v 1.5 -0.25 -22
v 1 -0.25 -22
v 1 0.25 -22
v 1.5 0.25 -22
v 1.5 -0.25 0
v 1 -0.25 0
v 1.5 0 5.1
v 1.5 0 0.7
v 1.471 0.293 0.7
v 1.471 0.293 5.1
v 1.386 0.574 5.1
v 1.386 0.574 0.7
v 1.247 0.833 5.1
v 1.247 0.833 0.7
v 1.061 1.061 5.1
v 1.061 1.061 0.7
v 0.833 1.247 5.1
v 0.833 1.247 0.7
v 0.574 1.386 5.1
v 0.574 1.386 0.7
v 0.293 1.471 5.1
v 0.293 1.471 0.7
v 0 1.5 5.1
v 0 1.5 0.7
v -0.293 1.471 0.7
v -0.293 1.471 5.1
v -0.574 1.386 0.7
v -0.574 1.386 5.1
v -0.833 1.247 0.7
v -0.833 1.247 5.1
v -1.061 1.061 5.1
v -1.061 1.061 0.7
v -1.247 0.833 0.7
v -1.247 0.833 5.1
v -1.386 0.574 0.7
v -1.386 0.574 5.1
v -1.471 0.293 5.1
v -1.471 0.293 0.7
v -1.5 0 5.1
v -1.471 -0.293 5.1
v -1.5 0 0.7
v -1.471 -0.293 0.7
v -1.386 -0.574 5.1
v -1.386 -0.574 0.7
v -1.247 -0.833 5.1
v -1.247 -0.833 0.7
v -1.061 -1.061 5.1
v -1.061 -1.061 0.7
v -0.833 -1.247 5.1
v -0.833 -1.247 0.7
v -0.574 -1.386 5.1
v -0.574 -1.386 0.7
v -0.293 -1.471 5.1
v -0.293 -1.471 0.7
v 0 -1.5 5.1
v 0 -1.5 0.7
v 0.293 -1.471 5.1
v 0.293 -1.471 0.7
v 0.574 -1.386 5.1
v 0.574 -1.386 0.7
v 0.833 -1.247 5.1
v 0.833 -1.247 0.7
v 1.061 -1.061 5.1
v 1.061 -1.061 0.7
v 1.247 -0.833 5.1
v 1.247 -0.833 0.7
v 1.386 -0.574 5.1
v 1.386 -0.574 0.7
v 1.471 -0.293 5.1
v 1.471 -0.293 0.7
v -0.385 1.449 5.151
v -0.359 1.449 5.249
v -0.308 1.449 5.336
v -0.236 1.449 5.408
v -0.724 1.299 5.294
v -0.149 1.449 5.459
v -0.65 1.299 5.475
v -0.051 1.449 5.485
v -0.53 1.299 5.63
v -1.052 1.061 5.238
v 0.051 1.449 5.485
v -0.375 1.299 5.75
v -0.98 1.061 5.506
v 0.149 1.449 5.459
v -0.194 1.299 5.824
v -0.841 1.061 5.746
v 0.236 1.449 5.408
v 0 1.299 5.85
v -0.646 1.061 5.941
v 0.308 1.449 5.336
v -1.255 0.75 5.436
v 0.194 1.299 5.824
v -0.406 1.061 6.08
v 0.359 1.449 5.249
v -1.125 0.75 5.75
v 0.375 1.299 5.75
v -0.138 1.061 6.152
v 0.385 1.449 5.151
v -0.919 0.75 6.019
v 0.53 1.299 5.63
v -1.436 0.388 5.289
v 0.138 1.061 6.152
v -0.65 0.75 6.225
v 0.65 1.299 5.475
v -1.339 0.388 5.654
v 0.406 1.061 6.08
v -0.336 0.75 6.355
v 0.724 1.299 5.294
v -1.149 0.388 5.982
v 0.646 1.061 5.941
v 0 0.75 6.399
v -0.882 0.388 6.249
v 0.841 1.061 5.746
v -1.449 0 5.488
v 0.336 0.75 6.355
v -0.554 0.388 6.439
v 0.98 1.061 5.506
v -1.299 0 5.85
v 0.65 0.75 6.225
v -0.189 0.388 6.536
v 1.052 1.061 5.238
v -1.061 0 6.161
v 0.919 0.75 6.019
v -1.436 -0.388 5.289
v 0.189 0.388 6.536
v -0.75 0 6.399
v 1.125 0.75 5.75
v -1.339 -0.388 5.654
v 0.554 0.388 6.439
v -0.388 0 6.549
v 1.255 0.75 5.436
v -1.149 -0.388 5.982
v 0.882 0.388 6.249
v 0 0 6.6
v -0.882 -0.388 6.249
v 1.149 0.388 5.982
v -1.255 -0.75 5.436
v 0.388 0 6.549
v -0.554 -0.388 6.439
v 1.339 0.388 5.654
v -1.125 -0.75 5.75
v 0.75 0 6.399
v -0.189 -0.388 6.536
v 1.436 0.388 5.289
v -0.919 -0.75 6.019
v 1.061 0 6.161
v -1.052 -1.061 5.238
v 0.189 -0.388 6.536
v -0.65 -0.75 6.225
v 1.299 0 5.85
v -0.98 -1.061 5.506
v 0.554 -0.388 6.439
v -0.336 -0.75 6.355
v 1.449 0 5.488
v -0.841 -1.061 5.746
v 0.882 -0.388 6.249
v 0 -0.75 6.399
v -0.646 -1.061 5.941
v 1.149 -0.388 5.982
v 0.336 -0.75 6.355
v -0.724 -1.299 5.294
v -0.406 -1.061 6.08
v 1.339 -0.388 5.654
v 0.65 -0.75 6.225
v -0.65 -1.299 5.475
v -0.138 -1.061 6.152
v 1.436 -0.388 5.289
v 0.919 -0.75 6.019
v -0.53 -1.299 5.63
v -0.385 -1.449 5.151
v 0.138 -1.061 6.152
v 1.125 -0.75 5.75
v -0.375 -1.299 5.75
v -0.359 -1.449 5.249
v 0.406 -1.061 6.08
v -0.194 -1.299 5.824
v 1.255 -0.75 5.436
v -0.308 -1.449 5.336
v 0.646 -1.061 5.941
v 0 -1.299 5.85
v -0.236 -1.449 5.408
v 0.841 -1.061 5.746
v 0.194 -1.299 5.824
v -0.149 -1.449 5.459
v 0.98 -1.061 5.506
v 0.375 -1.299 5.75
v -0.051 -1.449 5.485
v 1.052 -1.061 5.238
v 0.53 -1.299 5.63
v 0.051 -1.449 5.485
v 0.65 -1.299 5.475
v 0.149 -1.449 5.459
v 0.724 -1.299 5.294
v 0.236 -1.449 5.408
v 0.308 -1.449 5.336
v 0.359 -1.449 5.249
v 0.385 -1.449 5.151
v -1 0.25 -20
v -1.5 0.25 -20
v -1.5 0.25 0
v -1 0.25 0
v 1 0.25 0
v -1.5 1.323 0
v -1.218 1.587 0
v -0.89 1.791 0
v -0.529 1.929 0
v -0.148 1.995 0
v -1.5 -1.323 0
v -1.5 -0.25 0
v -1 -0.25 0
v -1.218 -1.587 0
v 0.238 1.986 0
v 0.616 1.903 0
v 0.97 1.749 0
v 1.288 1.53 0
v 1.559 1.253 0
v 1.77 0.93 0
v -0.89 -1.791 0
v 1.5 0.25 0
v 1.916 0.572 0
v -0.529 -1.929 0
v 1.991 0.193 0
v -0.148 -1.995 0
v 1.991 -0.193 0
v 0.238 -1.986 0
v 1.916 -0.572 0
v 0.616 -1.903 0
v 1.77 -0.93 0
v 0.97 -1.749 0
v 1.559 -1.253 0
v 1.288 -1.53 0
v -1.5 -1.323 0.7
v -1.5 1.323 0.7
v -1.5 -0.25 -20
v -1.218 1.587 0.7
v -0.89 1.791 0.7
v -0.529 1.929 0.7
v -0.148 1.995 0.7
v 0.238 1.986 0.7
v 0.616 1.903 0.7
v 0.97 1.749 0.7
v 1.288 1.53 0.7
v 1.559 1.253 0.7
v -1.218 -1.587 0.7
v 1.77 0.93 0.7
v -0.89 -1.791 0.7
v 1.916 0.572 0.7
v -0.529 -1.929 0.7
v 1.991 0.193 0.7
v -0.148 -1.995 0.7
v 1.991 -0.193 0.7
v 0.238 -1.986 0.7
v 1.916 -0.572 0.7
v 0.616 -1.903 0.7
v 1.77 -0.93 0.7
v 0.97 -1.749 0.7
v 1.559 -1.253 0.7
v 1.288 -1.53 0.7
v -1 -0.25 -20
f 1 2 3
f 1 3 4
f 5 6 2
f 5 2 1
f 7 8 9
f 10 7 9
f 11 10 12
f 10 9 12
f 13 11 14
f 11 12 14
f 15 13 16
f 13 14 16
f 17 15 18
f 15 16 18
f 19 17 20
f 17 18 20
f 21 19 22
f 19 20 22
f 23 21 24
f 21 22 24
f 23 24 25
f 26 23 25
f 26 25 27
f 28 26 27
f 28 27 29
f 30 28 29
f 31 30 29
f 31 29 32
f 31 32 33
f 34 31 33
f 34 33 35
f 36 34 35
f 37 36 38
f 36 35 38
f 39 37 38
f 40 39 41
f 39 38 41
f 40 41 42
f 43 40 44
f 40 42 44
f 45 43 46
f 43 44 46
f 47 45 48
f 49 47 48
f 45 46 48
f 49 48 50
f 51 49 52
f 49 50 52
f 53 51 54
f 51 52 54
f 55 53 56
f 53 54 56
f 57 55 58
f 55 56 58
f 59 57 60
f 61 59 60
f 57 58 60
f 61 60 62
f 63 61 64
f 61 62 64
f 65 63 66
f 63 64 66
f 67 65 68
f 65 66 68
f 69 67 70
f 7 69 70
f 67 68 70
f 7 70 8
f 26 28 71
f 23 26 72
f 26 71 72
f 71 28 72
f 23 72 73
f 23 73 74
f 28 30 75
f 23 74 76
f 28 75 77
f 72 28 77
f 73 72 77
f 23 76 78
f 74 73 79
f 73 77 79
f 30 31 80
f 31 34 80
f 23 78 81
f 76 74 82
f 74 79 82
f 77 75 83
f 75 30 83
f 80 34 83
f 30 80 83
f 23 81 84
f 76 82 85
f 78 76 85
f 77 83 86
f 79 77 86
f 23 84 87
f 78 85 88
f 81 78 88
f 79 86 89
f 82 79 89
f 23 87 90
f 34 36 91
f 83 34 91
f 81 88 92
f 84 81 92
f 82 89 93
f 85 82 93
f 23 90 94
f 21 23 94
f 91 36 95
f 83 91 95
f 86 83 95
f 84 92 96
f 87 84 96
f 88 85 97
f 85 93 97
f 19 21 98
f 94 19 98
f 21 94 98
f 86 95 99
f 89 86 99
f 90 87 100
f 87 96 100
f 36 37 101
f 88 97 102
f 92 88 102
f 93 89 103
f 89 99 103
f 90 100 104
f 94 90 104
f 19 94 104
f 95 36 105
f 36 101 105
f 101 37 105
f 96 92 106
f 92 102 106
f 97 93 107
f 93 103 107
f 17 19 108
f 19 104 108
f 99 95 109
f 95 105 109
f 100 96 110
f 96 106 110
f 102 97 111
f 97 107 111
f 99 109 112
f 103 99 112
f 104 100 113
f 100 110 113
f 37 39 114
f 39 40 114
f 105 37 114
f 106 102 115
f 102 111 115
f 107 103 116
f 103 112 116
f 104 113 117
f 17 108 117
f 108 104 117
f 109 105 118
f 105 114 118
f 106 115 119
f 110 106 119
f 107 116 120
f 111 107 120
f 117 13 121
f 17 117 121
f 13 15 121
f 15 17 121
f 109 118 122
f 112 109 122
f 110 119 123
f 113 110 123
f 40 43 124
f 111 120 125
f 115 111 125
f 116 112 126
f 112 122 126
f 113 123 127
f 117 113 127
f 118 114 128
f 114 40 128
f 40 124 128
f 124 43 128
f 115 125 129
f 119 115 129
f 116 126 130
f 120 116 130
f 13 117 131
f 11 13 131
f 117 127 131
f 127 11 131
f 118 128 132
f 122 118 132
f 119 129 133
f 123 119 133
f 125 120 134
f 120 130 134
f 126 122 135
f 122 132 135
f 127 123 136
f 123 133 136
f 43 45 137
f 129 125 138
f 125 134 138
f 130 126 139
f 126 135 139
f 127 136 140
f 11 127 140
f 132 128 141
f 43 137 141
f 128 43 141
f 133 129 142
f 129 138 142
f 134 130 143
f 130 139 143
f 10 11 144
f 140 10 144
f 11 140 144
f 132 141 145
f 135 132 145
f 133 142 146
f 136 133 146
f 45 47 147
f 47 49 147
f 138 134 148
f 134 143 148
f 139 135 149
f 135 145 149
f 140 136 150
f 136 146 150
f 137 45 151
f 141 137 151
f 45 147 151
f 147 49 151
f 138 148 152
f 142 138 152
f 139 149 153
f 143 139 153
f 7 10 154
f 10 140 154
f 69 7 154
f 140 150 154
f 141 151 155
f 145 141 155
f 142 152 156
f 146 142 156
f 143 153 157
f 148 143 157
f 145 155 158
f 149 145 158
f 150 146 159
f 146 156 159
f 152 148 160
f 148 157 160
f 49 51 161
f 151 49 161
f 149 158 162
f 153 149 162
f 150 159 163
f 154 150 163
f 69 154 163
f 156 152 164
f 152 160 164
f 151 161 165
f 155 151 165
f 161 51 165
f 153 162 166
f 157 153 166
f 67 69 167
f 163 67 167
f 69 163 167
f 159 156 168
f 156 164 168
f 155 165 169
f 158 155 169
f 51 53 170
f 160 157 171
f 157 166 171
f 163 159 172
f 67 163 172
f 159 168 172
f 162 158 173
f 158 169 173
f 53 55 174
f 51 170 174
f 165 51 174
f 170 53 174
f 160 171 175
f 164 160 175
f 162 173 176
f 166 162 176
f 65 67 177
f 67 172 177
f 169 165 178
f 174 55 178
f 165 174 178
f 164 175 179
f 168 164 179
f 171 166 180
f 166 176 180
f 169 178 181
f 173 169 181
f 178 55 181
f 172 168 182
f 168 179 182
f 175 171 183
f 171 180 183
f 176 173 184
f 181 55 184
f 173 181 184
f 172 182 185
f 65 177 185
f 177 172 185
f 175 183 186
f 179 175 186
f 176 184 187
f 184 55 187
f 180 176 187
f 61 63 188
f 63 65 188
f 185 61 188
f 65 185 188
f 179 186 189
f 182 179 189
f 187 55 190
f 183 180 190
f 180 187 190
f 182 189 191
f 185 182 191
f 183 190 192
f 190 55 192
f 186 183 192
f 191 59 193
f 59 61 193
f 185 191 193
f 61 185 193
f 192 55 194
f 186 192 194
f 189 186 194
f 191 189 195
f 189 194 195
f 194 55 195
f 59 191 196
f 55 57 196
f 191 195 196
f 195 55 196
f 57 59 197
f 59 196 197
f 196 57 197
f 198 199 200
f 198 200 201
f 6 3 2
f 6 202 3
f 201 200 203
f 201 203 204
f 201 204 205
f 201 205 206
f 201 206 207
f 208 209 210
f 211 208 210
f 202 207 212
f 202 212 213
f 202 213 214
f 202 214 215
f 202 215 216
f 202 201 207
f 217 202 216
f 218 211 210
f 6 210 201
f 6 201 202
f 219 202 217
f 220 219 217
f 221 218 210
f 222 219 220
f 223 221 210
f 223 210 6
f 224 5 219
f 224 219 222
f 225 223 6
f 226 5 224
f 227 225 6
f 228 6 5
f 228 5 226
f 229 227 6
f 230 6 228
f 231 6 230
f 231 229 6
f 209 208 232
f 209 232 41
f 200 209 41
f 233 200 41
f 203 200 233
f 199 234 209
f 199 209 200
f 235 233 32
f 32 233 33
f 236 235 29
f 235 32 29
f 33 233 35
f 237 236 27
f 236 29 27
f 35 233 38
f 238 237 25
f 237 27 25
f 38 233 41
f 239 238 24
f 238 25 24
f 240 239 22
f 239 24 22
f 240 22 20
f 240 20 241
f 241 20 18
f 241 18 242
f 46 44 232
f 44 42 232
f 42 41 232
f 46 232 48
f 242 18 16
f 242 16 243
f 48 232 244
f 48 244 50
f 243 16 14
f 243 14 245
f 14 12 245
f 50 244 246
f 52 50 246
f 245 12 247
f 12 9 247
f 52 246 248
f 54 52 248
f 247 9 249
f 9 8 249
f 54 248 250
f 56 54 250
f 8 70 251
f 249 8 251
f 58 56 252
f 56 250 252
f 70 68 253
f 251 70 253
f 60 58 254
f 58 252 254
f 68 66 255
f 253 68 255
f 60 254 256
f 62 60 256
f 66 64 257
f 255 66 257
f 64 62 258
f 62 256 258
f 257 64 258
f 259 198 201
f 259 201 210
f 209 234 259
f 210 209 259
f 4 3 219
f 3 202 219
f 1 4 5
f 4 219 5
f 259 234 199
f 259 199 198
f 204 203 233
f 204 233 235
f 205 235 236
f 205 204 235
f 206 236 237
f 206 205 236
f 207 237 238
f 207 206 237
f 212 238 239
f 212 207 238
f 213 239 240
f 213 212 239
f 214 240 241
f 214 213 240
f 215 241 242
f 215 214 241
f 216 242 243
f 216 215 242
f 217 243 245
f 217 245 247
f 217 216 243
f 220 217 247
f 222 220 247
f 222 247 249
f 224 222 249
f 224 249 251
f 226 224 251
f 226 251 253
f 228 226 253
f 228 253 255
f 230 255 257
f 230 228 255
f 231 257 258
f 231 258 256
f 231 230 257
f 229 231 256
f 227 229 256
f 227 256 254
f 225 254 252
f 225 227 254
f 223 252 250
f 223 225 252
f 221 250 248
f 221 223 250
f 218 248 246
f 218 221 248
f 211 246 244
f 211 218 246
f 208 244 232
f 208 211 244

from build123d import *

# Parameters (mm, degrees)
F0_R      = 1.5
F1_DEPTH  = 5.1
F5_DEPTH  = 0.7
F6_W      = 0.5
F6_H      = 0.5
F7_DEPTH  = 20
F7_FACE_W = 0.5
F7_FACE_H = 0.5
F8_DEPTH  = 2


with BuildPart() as f1:
    # F0 (on Top) → F1 (new body)
    with BuildSketch(Plane.XY):
        Circle(F0_R)
    extrude(amount=F1_DEPTH)

    # F2 (on face) → F3 (revolve)
    with BuildSketch(Plane.XY.offset(5.1)):
        with BuildLine():
            ThreePointArc((0, 1.5), (-1.5, 0), (0, -1.5))
            Line((0, -1.5), (0, 1.5))
        make_face()
    revolve(axis=Axis((0, 0, 5.1), (0, 1, 0)))

    # F4 (on face) → F5 (join)
    with BuildSketch(Plane(origin=(0, 0, 0), x_dir=(1, 0, 0), z_dir=(0, 0, -1))):
        with BuildLine():
            Line((-1.5, 1.322876), (-1.5, -1.322876))
            ThreePointArc((-1.5, -1.322876), (2, 0), (-1.5, 1.322876))
        make_face()
    extrude(amount=-F5_DEPTH)

    # F6 (on face) → F7 (join)
    with BuildSketch(Plane(origin=(0, 0, 0), x_dir=(1, 0, 0), z_dir=(0, 0, -1))):
        with Locations((1.25, 0)):
            Rectangle(F6_W, F6_H)
        with Locations((-1.25, 0)):
            Rectangle(F6_W, F6_H)
    extrude(amount=F7_DEPTH)

    # F7_face (on face) → F8 (join)
    with BuildSketch(Plane(origin=(1.25, 0, -20), x_dir=(1, 0, 0), z_dir=(0, 0, -1))):
        Rectangle(F7_FACE_W, F7_FACE_H)
    extrude(amount=F8_DEPTH)


solid = f1.part
